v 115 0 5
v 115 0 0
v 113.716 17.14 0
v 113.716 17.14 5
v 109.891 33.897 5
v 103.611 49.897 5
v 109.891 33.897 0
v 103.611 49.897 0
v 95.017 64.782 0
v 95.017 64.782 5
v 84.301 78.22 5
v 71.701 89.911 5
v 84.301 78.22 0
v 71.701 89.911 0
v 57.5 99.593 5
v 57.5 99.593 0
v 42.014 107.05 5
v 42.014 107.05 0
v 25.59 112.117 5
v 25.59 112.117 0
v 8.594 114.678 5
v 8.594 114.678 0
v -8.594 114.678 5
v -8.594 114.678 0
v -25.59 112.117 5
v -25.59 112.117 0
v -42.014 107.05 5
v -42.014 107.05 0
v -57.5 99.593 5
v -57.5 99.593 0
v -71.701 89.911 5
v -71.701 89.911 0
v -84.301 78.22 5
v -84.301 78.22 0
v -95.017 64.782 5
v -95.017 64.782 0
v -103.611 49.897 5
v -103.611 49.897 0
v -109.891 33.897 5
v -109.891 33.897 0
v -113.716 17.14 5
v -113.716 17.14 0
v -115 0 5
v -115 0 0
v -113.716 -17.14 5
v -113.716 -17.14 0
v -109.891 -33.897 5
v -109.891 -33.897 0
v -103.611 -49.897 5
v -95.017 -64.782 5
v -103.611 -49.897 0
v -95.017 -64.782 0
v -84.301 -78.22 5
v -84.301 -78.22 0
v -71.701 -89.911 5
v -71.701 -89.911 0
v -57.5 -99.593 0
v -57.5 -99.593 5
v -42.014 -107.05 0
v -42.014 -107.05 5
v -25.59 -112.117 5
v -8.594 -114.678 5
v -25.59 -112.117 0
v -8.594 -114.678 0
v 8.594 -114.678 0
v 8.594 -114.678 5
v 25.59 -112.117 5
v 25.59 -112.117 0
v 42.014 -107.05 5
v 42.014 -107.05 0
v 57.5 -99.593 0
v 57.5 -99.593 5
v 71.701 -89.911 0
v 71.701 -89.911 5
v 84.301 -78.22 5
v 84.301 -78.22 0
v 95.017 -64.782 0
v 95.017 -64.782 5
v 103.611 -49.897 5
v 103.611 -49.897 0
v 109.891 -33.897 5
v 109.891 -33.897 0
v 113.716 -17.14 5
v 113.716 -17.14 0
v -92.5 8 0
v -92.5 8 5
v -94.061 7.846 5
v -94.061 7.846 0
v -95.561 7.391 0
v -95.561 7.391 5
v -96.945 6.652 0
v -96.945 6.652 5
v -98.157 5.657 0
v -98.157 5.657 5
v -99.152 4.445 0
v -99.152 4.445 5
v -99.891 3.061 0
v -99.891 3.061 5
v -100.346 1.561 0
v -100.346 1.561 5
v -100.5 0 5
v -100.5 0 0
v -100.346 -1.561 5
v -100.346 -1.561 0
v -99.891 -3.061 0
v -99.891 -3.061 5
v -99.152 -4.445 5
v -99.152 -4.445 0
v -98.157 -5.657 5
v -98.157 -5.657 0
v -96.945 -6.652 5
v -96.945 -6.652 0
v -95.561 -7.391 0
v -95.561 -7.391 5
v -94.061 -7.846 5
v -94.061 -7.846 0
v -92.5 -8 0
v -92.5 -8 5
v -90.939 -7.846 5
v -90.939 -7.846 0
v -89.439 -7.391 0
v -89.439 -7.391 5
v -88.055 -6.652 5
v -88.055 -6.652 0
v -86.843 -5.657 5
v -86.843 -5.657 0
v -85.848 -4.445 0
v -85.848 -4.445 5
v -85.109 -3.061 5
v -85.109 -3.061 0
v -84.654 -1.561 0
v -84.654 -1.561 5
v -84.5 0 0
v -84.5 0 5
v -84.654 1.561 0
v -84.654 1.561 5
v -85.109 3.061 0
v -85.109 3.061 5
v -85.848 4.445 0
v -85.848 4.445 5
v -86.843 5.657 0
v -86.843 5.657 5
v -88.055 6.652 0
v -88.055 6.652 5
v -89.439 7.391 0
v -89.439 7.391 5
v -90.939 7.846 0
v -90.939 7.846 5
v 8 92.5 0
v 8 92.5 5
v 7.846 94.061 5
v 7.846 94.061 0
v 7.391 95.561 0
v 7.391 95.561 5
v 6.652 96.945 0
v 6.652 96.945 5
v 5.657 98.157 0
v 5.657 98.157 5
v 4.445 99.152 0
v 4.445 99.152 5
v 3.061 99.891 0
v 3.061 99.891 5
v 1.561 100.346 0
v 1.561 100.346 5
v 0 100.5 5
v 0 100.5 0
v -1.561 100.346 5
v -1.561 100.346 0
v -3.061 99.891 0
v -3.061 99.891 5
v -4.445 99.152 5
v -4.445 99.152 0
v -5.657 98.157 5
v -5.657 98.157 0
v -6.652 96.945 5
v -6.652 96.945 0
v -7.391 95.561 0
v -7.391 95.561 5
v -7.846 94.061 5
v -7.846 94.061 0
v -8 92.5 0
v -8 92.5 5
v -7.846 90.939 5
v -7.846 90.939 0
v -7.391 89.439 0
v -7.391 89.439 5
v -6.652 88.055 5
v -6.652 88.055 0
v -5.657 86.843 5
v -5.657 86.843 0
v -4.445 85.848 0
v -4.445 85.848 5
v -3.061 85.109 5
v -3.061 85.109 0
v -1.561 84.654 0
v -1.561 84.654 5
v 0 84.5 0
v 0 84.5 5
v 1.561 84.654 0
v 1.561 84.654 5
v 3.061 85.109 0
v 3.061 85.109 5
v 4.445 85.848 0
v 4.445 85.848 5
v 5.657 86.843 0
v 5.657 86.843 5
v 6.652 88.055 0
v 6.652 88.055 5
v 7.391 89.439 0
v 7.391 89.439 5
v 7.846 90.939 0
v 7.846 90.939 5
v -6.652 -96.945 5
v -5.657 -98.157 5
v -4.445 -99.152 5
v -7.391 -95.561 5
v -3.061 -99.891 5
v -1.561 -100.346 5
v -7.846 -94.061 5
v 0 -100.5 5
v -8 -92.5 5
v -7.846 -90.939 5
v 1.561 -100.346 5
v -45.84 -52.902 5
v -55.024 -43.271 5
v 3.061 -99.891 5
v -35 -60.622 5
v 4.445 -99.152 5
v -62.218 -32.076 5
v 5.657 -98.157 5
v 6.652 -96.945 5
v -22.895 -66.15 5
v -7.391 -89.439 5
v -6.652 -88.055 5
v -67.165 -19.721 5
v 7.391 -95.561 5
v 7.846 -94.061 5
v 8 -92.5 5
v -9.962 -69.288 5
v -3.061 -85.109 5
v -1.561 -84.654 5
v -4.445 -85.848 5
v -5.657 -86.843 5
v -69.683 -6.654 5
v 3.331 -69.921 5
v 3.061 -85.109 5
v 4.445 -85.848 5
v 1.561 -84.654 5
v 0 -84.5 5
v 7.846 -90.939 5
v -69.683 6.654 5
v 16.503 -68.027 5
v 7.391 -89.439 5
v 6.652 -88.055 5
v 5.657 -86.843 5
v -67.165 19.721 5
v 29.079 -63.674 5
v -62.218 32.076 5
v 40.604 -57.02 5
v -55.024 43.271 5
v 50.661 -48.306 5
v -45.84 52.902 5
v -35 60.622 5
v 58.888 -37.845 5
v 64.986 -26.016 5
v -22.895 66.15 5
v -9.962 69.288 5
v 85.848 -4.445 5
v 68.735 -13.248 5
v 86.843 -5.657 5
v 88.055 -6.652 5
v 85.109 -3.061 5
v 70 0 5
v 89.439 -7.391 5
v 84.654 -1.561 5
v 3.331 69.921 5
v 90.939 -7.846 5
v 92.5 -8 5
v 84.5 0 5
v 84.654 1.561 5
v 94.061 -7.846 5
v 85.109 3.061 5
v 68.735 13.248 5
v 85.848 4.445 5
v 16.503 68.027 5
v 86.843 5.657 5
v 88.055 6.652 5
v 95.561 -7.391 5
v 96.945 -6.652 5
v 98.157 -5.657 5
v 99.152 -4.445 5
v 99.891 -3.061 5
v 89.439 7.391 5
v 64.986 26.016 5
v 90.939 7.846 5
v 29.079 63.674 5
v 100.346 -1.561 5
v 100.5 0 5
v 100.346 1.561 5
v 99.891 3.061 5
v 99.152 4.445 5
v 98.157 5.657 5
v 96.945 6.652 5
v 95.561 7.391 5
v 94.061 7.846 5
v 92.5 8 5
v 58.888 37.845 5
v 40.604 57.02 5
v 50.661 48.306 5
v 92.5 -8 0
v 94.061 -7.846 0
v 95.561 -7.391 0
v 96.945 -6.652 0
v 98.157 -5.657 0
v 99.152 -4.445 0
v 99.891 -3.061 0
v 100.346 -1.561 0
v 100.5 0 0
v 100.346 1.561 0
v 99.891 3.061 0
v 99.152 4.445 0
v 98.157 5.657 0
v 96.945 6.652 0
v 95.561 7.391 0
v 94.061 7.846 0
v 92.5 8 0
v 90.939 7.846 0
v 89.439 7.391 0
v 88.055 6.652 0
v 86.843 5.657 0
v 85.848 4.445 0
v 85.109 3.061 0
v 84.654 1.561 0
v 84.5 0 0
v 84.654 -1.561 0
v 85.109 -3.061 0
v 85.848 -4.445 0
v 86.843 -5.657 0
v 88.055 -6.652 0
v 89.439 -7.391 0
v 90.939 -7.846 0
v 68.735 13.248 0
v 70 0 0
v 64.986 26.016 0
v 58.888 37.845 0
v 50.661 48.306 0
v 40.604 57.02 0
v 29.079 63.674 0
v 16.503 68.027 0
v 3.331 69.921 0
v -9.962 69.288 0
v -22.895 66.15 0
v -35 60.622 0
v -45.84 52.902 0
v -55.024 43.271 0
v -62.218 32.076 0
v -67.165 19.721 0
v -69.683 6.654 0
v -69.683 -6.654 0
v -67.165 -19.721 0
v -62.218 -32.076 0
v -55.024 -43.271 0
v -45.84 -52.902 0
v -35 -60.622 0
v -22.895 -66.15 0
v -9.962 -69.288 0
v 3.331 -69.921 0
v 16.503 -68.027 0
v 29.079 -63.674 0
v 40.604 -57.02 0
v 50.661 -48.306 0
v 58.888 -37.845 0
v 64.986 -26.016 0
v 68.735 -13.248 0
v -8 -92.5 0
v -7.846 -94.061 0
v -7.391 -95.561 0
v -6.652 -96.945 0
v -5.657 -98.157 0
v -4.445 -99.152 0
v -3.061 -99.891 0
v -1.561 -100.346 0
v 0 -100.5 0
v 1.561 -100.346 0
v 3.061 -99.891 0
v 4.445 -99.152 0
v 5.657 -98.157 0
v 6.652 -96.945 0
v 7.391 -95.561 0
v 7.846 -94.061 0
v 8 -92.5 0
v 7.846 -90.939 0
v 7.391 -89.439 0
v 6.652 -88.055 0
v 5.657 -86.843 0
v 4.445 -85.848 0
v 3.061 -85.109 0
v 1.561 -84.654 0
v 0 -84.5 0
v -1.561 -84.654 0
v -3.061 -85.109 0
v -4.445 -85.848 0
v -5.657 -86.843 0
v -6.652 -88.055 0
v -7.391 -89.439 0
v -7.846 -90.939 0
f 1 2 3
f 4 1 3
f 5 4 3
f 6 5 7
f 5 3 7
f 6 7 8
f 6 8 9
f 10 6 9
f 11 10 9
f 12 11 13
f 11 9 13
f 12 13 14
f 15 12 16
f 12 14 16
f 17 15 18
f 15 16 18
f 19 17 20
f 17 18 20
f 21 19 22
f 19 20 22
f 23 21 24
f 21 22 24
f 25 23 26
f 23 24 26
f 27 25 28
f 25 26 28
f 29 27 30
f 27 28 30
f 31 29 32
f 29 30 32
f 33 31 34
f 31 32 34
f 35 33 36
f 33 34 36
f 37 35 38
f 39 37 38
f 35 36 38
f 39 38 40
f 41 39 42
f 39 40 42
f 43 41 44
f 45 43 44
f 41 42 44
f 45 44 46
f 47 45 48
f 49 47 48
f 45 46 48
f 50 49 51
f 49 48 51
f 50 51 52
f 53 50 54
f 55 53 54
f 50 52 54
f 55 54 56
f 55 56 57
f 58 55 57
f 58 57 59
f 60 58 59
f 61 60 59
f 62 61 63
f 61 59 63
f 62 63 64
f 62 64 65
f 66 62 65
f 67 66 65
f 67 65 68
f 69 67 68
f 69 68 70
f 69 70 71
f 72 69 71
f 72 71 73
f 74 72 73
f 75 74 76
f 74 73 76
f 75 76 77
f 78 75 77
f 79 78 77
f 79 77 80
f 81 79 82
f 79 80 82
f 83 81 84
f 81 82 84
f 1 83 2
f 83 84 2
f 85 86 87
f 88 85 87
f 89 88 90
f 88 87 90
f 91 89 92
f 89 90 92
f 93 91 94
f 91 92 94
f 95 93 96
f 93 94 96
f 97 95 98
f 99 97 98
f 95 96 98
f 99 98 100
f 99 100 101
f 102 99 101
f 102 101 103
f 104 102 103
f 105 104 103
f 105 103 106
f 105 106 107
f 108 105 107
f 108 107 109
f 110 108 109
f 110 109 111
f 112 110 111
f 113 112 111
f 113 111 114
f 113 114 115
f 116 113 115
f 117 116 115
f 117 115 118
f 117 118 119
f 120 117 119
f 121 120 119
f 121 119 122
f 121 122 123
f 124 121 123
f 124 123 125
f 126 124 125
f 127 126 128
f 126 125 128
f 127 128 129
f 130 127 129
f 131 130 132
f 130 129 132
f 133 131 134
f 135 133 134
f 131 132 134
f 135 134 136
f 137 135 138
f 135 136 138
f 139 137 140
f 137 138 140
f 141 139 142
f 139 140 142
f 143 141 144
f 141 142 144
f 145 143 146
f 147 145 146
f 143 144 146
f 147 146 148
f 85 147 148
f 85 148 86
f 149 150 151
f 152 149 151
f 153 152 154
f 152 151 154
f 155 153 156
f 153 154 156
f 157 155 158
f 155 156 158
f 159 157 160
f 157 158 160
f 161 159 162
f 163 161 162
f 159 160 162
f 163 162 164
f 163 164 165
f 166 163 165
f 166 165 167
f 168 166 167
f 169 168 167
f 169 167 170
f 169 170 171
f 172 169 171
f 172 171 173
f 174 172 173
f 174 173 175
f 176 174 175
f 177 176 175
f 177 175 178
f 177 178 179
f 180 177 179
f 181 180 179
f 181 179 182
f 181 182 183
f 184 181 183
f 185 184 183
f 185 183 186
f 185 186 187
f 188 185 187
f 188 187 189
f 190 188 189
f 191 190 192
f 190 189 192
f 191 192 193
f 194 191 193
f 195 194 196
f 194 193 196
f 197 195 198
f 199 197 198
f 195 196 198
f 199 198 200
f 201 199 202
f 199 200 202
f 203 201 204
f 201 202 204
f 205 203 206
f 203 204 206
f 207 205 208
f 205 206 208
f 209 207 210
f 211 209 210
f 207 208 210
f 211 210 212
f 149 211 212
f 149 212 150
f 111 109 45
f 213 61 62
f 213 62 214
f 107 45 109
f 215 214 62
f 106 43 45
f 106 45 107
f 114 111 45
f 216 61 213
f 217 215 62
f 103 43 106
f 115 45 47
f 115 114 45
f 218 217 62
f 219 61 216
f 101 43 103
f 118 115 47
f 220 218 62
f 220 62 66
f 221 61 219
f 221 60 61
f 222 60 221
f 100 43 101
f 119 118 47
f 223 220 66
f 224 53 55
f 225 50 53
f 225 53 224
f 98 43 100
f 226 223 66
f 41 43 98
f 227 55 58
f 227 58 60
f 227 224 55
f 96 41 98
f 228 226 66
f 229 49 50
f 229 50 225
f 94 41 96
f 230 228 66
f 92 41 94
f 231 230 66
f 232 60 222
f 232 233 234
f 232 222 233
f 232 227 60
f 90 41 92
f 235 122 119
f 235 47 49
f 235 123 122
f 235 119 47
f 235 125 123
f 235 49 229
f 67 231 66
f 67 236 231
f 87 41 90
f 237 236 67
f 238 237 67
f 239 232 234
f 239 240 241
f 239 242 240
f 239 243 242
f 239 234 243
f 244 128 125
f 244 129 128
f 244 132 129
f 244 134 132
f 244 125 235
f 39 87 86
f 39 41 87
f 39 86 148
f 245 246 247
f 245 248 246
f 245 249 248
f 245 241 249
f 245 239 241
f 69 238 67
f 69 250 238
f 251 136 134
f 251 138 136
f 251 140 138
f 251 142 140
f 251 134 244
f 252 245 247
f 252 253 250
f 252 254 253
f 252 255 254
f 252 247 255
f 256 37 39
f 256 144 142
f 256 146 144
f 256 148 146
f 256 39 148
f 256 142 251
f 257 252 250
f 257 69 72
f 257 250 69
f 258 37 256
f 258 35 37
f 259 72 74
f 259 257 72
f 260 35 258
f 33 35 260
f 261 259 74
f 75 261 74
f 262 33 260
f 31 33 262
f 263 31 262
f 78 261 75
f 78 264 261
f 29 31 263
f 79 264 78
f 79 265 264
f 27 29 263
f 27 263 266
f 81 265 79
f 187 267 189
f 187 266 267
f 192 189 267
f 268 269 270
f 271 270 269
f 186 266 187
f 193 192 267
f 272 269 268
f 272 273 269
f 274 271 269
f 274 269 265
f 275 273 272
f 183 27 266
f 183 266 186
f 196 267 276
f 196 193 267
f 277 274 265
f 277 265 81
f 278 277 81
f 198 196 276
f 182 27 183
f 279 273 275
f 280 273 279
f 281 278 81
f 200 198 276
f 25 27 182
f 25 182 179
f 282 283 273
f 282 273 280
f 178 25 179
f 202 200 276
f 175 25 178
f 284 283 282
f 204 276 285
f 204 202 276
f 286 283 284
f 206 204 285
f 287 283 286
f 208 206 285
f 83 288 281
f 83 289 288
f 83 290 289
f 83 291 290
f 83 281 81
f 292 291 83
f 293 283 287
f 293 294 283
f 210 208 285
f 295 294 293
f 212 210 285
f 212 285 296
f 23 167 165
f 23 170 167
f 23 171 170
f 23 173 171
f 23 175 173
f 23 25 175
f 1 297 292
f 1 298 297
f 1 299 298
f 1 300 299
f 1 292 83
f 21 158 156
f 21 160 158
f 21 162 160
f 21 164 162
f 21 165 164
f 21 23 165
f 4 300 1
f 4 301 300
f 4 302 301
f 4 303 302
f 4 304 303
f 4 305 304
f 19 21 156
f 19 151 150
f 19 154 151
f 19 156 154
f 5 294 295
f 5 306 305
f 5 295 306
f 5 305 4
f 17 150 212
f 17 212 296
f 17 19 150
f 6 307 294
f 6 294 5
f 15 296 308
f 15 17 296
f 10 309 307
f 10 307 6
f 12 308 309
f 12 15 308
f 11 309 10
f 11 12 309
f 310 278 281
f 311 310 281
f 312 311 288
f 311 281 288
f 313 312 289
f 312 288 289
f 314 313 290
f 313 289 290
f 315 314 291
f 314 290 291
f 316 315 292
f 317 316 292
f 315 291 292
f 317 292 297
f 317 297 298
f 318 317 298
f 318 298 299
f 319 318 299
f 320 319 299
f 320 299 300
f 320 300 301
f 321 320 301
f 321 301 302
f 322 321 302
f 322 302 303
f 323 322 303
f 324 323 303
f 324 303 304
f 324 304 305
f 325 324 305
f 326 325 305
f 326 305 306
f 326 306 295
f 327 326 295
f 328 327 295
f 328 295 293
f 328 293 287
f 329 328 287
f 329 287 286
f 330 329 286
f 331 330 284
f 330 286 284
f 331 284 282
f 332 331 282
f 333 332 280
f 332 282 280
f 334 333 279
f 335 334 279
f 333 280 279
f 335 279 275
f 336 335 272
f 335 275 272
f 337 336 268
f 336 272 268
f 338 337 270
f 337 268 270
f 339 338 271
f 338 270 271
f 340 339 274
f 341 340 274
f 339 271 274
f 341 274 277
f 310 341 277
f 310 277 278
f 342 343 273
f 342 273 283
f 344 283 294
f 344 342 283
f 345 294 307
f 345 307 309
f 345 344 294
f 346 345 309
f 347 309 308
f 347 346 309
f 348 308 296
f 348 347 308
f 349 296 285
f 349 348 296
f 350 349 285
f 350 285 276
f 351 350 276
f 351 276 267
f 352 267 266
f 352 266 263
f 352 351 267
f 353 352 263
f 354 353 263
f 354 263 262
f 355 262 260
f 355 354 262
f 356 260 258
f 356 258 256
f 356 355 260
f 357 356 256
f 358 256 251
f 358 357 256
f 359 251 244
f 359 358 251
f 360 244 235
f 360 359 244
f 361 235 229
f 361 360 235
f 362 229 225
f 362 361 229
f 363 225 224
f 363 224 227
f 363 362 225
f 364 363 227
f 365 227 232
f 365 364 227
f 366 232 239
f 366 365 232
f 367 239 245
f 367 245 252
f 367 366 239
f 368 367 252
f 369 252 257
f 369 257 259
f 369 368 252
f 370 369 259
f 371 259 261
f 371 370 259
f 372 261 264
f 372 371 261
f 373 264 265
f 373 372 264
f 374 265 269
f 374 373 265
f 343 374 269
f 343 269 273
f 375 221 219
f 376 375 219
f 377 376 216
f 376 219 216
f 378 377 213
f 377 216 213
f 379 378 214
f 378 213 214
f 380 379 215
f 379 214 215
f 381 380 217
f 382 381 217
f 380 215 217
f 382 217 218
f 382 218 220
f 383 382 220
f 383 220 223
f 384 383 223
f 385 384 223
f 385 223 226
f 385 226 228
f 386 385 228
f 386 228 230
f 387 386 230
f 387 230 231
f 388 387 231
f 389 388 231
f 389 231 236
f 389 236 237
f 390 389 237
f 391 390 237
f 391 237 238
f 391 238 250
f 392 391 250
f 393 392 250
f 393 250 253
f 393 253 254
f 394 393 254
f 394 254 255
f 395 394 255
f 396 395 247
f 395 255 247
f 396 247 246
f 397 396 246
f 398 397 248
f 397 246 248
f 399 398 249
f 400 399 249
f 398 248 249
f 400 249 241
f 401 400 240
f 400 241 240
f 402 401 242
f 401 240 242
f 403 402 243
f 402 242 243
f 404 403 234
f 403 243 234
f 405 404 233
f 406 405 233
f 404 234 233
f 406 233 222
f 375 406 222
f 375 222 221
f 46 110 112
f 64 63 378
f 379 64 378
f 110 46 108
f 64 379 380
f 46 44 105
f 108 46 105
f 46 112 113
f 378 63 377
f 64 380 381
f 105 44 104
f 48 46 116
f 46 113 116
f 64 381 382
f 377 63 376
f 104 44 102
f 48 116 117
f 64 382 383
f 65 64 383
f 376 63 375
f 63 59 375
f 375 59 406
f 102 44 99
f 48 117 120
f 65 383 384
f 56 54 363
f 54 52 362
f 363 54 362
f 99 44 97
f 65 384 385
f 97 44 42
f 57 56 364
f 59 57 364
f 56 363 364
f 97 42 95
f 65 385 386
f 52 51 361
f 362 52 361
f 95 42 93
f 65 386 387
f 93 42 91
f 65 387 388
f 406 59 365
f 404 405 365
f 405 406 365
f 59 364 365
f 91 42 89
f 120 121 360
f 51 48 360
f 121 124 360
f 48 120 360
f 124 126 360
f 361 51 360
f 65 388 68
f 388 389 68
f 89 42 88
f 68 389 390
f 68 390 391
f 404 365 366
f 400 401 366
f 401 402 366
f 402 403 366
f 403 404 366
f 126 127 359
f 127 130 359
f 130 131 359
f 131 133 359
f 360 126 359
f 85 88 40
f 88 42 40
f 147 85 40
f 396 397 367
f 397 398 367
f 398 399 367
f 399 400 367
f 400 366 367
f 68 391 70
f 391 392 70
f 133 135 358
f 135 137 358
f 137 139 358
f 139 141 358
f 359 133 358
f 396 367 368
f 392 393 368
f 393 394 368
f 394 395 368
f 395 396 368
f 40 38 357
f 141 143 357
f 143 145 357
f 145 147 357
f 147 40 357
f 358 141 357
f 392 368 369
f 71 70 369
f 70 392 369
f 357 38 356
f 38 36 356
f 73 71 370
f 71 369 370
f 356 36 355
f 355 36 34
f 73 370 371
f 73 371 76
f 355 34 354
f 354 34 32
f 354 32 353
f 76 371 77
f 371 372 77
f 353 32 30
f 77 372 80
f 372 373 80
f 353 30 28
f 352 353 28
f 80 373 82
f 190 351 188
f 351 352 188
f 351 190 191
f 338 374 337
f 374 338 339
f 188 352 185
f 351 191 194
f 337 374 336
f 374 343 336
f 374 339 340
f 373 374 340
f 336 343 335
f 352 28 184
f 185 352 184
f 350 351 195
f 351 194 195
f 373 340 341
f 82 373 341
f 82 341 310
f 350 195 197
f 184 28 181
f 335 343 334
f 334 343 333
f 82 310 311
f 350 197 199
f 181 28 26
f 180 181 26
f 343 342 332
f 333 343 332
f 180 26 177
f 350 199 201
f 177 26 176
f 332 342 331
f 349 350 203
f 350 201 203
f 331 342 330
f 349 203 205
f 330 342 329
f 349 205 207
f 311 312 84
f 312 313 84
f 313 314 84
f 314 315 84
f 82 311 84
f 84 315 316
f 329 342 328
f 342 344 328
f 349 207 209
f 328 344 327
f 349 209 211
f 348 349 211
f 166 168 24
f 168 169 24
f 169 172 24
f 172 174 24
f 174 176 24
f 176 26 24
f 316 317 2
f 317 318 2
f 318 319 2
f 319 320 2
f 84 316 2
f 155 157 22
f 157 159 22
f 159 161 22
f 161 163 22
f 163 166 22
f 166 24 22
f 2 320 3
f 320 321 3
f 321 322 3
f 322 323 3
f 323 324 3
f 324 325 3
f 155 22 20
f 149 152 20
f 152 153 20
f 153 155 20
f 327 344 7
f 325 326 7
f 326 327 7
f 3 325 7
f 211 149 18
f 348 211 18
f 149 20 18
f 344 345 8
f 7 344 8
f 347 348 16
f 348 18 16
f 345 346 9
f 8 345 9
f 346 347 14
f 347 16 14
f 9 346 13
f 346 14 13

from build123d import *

# Parameters (mm, degrees)
F0_R            = 115
F0_R_2          = 70
F1_DEPTH        = 5
F2_R            = 8
F3_DEPTH        = 25
F3_COPIES_COUNT = 4


# Not quite as in the source:
# - a pattern or mirror of a feature is missing from the dataset's text; its kind, count and spacing are read off the source's solid


with BuildPart() as f1:
    # F0 (on Top) → F1 (new body)
    with BuildSketch(Plane.XY):
        Circle(F0_R)
        Circle(F0_R_2, mode=Mode.SUBTRACT)
    extrude(amount=F1_DEPTH)

    # F2 (on face) → F3 (cut)
    with BuildSketch(Plane.XY.offset(5)):
        with Locations((0, 92.5)):
            Circle(F2_R)
    f3 = extrude(amount=-F3_DEPTH, mode=Mode.SUBTRACT)

    # F3_copies: F3 ×4 about axis
    f3_copies_axis = Axis((0, 0, 0), (0, 0, 1))
    for i in range(1, F3_COPIES_COUNT):
        add(f3.rotate(f3_copies_axis, i * 360 / F3_COPIES_COUNT), mode=Mode.SUBTRACT)


solid = f1.part
